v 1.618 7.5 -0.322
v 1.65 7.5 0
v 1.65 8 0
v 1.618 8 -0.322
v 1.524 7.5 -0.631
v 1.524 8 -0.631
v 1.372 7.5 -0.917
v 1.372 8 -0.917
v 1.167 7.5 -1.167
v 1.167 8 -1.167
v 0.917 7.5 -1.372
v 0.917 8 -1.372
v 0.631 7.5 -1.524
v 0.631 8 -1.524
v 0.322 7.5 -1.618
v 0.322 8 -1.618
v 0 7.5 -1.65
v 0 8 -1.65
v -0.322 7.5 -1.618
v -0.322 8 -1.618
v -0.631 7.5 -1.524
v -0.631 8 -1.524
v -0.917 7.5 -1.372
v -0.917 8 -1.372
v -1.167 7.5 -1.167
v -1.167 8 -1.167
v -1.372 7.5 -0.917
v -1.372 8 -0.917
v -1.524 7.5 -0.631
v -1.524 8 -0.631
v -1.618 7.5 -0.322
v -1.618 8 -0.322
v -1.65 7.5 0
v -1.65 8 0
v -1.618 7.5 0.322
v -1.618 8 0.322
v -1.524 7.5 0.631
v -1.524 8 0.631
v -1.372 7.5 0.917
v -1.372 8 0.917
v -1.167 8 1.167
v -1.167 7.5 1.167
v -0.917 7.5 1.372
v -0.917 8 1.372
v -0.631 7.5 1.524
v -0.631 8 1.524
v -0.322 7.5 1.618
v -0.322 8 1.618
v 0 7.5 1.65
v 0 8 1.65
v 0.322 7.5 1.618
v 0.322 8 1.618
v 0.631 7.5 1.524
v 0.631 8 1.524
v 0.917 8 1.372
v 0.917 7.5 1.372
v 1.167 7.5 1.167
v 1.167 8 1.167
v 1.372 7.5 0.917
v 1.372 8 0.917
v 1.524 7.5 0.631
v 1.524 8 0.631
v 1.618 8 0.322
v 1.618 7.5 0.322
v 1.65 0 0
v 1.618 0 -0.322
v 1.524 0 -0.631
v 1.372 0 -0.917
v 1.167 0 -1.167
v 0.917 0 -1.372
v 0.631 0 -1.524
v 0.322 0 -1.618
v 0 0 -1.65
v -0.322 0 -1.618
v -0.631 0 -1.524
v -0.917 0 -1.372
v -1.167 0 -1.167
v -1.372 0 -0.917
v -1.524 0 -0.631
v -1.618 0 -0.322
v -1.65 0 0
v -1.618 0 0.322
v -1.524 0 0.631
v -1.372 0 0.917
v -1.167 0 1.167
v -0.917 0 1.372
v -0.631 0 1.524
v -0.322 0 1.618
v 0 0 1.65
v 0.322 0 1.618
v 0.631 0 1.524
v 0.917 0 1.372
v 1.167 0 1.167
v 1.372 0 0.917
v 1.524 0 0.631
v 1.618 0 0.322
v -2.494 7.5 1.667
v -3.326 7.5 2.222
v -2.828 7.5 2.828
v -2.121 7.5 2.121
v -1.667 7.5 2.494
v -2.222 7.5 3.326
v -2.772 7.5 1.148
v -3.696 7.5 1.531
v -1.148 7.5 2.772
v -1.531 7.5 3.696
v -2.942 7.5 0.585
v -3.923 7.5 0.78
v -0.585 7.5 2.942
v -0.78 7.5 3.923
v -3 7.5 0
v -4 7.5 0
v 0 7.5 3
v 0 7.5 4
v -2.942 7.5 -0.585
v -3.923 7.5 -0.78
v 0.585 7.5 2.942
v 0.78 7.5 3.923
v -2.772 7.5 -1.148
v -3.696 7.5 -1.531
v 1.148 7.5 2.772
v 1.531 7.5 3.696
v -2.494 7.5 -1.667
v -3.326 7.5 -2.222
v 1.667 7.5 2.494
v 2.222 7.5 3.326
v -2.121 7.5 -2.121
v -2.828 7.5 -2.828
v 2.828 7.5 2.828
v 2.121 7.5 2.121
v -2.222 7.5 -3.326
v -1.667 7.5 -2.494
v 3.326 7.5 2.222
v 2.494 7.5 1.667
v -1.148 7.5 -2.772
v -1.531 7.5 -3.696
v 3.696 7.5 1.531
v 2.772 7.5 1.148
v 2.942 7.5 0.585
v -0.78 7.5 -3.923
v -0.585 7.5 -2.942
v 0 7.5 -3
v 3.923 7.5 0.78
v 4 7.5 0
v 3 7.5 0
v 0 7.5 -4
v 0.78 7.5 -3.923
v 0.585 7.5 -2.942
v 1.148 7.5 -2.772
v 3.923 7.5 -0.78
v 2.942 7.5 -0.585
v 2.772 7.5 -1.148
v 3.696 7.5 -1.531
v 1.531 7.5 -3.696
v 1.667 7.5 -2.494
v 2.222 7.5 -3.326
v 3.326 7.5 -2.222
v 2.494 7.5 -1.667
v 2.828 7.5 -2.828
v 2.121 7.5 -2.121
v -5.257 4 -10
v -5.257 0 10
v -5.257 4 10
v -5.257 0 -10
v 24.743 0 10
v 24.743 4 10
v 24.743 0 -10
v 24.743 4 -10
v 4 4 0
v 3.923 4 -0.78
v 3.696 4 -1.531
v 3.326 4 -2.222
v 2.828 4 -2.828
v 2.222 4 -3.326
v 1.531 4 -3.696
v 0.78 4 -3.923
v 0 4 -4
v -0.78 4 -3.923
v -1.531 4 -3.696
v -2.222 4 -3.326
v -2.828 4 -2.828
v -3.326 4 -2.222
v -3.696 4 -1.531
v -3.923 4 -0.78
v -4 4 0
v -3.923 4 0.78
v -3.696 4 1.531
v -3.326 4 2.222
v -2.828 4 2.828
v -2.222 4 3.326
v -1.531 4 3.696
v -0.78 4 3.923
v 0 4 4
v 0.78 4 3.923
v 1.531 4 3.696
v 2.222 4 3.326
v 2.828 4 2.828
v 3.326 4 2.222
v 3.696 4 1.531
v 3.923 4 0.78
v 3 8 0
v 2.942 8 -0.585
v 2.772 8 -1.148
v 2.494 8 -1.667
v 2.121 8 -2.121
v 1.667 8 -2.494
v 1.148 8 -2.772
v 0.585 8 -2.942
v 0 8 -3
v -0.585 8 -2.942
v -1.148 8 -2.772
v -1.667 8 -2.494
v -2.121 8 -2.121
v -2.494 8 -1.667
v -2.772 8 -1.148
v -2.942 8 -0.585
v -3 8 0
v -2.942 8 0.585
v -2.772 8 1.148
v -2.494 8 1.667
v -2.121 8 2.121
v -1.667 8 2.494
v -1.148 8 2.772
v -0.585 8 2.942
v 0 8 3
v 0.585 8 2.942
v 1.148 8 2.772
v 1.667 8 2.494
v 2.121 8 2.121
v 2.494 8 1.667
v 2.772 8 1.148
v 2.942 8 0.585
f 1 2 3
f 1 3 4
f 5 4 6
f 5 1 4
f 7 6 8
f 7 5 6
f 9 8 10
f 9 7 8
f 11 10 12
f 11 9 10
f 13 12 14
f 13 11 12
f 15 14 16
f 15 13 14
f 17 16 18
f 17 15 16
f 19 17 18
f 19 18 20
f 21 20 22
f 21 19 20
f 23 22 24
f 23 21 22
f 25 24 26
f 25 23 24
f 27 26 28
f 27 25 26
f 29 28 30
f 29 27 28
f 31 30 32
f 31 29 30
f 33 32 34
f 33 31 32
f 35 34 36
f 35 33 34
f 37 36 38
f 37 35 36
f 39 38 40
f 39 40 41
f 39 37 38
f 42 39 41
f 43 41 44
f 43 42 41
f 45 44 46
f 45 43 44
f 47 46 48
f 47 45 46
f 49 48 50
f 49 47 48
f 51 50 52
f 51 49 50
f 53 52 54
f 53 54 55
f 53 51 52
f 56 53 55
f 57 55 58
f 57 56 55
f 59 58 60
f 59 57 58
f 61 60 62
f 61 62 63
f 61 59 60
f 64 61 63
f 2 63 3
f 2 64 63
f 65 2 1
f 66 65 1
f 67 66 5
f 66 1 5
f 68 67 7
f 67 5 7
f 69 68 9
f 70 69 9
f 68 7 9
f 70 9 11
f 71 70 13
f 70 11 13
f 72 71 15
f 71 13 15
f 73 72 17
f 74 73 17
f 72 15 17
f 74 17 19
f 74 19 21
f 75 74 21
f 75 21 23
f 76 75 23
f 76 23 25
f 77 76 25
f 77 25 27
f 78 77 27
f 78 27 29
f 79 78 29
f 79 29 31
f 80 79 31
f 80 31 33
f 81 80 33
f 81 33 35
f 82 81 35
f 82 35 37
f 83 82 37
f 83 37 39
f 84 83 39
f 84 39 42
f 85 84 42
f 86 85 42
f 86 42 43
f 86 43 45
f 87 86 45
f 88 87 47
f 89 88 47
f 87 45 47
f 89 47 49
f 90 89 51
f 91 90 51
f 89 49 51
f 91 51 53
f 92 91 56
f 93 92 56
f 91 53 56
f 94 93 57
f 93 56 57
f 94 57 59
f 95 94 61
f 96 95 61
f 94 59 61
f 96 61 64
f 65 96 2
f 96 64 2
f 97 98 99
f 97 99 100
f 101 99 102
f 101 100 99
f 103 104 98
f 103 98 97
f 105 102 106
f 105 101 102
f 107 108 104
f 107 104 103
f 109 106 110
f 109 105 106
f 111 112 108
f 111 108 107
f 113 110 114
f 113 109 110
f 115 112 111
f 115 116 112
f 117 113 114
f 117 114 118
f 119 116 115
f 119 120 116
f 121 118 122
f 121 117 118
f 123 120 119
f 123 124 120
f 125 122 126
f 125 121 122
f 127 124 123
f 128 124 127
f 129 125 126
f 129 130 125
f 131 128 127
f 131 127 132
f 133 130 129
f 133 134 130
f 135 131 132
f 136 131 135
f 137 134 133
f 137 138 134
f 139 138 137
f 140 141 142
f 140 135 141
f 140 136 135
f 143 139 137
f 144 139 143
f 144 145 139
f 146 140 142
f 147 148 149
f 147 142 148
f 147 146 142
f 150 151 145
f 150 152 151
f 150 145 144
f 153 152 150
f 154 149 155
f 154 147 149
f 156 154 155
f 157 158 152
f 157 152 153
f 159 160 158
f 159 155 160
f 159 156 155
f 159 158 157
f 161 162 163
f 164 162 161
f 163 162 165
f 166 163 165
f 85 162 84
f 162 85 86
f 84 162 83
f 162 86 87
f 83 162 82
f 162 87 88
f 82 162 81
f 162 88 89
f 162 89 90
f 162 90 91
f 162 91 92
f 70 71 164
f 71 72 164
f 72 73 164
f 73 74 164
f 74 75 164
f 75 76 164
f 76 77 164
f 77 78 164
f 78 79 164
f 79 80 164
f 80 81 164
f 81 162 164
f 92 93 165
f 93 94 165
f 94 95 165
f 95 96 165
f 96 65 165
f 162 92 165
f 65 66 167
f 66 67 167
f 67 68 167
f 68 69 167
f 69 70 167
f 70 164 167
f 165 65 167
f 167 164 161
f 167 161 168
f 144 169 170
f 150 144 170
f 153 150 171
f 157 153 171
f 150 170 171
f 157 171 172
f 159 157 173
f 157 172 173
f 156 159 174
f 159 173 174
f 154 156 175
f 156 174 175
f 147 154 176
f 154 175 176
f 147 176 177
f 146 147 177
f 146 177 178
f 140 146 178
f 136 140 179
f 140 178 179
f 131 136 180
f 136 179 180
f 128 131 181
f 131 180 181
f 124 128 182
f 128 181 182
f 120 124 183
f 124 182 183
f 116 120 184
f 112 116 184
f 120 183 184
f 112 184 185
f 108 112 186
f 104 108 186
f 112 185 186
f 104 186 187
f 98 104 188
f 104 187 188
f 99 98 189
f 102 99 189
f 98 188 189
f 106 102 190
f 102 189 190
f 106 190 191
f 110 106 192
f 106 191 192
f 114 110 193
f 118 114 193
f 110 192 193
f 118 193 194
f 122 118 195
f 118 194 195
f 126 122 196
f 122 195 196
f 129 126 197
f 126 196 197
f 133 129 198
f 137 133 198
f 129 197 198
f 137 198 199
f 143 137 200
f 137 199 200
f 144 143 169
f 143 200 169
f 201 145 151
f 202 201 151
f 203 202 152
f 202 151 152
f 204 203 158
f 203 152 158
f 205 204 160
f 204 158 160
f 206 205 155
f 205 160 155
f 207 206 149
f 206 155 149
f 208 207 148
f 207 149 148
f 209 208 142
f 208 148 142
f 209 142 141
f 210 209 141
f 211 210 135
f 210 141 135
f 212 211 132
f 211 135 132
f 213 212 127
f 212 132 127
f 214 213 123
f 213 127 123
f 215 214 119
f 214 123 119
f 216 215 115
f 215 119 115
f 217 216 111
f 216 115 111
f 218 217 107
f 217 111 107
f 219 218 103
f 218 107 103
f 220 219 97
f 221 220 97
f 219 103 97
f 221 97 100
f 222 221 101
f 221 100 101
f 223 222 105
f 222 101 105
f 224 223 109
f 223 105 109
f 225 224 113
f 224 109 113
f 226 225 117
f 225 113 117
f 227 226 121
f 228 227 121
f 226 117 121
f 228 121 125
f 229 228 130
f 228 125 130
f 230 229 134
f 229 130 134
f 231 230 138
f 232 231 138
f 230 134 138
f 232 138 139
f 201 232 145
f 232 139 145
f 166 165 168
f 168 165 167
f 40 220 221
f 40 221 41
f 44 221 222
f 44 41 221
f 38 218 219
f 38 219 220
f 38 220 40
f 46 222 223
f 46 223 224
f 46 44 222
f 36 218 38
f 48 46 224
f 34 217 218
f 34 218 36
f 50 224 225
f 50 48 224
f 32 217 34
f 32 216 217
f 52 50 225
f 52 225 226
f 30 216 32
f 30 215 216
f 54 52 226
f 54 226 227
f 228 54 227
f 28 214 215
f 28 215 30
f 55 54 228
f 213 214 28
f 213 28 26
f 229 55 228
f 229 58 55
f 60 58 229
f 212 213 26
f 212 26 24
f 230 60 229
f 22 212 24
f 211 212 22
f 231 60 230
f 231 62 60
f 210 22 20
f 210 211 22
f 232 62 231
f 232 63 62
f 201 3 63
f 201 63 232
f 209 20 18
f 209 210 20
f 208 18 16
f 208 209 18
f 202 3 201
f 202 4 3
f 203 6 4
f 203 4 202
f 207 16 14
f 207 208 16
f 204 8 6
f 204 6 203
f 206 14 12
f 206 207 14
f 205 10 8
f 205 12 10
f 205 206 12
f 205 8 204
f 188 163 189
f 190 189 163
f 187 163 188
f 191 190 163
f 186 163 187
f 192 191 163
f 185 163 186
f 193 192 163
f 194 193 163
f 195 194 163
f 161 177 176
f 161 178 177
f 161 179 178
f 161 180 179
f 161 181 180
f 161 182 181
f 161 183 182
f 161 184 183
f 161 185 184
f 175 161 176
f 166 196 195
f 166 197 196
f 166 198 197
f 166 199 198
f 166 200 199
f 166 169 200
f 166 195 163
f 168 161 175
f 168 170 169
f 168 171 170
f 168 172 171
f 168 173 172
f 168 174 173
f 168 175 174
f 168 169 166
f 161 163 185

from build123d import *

# Parameters (mm, degrees)
SKETCH1_W             = 30
SKETCH1_H             = 20
BOSS_EXTRUDE1_DEPTH   = 4
SKETCH2_R             = 4
BOSS_EXTRUDE2_DEPTH   = 3.5
M4X0_7_TAPPED_HOLE1_D = 3.3
SKETCH6_R             = 3
SKETCH6_R_2           = 1.65
BOSS_EXTRUDE3_DEPTH   = 0.5


with BuildPart() as part:
    # Sketch1 → Boss-Extrude1 (new body)
    with BuildSketch(Plane(origin=(0, 0, 0), x_dir=(1, 0, 0), z_dir=(0, 1, 0))):
        with Locations((9.74321034, 0)):
            Rectangle(SKETCH1_W, SKETCH1_H)
    extrude(amount=BOSS_EXTRUDE1_DEPTH)

    # Sketch2 → Boss-Extrude2 (add)
    with BuildSketch(Plane(origin=(0, 4, 0), x_dir=(1, 0, 0), z_dir=(0, 1, 0))):
        Circle(SKETCH2_R)
    extrude(amount=BOSS_EXTRUDE2_DEPTH)

    # M4x0.7 Tapped Hole1 (through all)
    with Locations(Plane(origin=(0, 0, 0), x_dir=(-1, 0, 0), z_dir=(0, -1, 0))):
        with Locations((0, 0)):
            Hole(M4X0_7_TAPPED_HOLE1_D / 2)

    # Sketch6 → Boss-Extrude3 (add)
    with BuildSketch(Plane(origin=(0, 7.5, 0), x_dir=(1, 0, 0), z_dir=(0, 1, 0))):
        Circle(SKETCH6_R)
        Circle(SKETCH6_R_2, mode=Mode.SUBTRACT)
    extrude(amount=BOSS_EXTRUDE3_DEPTH)


solid = part.part
